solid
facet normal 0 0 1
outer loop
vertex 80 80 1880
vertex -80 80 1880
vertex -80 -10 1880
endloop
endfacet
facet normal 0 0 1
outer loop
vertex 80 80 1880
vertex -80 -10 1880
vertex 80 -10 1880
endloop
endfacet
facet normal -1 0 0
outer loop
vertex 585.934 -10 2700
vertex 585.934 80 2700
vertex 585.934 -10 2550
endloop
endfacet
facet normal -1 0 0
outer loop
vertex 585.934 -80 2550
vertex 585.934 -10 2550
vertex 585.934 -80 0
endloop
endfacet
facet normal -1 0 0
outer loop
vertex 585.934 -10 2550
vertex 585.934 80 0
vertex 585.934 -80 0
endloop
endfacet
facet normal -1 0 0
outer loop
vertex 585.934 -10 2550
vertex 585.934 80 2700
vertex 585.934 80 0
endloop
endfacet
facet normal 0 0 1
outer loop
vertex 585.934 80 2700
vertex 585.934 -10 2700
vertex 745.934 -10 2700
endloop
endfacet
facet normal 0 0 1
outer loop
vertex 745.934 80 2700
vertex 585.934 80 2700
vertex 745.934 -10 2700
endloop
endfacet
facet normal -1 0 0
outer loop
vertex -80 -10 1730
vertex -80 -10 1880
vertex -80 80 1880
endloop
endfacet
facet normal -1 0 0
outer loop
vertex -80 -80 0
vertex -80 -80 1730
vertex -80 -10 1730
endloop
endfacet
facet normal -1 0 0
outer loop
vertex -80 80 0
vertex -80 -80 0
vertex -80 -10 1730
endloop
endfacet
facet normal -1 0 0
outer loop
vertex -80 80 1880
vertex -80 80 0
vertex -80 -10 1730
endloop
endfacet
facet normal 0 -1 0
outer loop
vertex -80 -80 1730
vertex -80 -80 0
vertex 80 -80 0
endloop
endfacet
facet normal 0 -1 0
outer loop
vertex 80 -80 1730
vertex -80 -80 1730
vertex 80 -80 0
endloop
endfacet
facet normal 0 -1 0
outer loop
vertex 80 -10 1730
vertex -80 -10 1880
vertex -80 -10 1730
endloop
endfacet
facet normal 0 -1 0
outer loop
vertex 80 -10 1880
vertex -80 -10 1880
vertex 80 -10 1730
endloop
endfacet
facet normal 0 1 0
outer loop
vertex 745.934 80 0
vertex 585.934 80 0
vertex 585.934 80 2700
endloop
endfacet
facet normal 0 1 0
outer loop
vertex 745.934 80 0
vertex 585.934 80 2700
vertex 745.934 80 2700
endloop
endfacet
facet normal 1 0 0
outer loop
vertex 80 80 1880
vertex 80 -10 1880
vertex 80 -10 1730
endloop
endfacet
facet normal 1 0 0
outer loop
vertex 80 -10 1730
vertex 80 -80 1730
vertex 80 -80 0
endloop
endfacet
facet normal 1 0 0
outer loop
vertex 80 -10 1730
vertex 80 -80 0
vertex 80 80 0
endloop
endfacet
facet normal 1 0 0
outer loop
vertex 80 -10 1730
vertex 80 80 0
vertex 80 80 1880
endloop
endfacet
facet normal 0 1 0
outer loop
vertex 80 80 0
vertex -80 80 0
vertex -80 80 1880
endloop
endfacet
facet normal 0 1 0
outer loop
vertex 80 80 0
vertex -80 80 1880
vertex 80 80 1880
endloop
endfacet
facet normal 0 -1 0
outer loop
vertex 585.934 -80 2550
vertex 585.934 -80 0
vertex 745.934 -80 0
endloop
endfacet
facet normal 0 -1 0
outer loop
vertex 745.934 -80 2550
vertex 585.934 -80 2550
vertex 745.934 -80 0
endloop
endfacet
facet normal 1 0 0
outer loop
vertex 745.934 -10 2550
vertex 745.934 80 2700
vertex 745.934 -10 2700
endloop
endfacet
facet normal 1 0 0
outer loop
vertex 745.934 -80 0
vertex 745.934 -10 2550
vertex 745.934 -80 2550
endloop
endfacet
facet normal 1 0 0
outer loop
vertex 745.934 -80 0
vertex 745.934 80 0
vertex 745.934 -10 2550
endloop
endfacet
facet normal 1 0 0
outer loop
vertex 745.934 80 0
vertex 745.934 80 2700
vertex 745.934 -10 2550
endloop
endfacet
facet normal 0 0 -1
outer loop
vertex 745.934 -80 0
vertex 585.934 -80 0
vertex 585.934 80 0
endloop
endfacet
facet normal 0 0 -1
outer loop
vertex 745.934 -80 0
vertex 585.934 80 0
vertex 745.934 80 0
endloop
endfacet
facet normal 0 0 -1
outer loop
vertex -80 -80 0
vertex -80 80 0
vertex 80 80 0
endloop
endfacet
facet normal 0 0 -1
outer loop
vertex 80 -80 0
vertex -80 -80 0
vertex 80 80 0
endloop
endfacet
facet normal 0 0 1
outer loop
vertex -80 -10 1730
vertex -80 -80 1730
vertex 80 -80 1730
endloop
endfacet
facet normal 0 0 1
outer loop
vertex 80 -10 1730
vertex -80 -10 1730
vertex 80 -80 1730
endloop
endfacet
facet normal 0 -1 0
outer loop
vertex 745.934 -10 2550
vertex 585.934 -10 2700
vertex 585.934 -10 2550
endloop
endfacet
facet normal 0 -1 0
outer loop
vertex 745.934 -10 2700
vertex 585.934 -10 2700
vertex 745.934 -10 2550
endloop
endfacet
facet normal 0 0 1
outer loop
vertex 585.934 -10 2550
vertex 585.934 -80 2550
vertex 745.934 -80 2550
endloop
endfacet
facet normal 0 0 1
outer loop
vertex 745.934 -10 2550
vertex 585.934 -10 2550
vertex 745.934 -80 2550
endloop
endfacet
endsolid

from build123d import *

# Parameters (mm, degrees)
F0_W     = 160
F0_H     = 160
F1_DEPTH = 1880
F2_W     = 160
F2_H     = 150
F3_DEPTH = 70
F4_W     = 160
F4_H     = 160
F5_DEPTH = 2700
F6_W     = 160
F6_H     = 150
F7_DEPTH = 70


with BuildPart() as f1:
    # F0 (on Top) → F1 (new body)
    with BuildSketch(Plane.XY):
        Rectangle(F0_W, F0_H)
    extrude(amount=F1_DEPTH)

    # F2 (on face) → F3 (cut)
    with BuildSketch(Plane.XZ.offset(80)):
        with Locations((0, 1805)):
            Rectangle(F2_W, F2_H)
    extrude(amount=-F3_DEPTH, mode=Mode.SUBTRACT)


with BuildPart() as f5:
    # F4 (on face) → F5 (new body)
    with BuildSketch(Plane(origin=(0, 0, 0), x_dir=(1, 0, 0), z_dir=(0, 0, -1))):
        with Locations((665.933626, 0)):
            Rectangle(F4_W, F4_H)
    extrude(amount=-F5_DEPTH)

    # F6 (on face) → F7 (cut)
    with BuildSketch(Plane.XZ.offset(80)):
        with Locations((665.933626, 2625)):
            Rectangle(F6_W, F6_H)
    extrude(amount=-F7_DEPTH, mode=Mode.SUBTRACT)


solid = Compound([f1.part, f5.part])
